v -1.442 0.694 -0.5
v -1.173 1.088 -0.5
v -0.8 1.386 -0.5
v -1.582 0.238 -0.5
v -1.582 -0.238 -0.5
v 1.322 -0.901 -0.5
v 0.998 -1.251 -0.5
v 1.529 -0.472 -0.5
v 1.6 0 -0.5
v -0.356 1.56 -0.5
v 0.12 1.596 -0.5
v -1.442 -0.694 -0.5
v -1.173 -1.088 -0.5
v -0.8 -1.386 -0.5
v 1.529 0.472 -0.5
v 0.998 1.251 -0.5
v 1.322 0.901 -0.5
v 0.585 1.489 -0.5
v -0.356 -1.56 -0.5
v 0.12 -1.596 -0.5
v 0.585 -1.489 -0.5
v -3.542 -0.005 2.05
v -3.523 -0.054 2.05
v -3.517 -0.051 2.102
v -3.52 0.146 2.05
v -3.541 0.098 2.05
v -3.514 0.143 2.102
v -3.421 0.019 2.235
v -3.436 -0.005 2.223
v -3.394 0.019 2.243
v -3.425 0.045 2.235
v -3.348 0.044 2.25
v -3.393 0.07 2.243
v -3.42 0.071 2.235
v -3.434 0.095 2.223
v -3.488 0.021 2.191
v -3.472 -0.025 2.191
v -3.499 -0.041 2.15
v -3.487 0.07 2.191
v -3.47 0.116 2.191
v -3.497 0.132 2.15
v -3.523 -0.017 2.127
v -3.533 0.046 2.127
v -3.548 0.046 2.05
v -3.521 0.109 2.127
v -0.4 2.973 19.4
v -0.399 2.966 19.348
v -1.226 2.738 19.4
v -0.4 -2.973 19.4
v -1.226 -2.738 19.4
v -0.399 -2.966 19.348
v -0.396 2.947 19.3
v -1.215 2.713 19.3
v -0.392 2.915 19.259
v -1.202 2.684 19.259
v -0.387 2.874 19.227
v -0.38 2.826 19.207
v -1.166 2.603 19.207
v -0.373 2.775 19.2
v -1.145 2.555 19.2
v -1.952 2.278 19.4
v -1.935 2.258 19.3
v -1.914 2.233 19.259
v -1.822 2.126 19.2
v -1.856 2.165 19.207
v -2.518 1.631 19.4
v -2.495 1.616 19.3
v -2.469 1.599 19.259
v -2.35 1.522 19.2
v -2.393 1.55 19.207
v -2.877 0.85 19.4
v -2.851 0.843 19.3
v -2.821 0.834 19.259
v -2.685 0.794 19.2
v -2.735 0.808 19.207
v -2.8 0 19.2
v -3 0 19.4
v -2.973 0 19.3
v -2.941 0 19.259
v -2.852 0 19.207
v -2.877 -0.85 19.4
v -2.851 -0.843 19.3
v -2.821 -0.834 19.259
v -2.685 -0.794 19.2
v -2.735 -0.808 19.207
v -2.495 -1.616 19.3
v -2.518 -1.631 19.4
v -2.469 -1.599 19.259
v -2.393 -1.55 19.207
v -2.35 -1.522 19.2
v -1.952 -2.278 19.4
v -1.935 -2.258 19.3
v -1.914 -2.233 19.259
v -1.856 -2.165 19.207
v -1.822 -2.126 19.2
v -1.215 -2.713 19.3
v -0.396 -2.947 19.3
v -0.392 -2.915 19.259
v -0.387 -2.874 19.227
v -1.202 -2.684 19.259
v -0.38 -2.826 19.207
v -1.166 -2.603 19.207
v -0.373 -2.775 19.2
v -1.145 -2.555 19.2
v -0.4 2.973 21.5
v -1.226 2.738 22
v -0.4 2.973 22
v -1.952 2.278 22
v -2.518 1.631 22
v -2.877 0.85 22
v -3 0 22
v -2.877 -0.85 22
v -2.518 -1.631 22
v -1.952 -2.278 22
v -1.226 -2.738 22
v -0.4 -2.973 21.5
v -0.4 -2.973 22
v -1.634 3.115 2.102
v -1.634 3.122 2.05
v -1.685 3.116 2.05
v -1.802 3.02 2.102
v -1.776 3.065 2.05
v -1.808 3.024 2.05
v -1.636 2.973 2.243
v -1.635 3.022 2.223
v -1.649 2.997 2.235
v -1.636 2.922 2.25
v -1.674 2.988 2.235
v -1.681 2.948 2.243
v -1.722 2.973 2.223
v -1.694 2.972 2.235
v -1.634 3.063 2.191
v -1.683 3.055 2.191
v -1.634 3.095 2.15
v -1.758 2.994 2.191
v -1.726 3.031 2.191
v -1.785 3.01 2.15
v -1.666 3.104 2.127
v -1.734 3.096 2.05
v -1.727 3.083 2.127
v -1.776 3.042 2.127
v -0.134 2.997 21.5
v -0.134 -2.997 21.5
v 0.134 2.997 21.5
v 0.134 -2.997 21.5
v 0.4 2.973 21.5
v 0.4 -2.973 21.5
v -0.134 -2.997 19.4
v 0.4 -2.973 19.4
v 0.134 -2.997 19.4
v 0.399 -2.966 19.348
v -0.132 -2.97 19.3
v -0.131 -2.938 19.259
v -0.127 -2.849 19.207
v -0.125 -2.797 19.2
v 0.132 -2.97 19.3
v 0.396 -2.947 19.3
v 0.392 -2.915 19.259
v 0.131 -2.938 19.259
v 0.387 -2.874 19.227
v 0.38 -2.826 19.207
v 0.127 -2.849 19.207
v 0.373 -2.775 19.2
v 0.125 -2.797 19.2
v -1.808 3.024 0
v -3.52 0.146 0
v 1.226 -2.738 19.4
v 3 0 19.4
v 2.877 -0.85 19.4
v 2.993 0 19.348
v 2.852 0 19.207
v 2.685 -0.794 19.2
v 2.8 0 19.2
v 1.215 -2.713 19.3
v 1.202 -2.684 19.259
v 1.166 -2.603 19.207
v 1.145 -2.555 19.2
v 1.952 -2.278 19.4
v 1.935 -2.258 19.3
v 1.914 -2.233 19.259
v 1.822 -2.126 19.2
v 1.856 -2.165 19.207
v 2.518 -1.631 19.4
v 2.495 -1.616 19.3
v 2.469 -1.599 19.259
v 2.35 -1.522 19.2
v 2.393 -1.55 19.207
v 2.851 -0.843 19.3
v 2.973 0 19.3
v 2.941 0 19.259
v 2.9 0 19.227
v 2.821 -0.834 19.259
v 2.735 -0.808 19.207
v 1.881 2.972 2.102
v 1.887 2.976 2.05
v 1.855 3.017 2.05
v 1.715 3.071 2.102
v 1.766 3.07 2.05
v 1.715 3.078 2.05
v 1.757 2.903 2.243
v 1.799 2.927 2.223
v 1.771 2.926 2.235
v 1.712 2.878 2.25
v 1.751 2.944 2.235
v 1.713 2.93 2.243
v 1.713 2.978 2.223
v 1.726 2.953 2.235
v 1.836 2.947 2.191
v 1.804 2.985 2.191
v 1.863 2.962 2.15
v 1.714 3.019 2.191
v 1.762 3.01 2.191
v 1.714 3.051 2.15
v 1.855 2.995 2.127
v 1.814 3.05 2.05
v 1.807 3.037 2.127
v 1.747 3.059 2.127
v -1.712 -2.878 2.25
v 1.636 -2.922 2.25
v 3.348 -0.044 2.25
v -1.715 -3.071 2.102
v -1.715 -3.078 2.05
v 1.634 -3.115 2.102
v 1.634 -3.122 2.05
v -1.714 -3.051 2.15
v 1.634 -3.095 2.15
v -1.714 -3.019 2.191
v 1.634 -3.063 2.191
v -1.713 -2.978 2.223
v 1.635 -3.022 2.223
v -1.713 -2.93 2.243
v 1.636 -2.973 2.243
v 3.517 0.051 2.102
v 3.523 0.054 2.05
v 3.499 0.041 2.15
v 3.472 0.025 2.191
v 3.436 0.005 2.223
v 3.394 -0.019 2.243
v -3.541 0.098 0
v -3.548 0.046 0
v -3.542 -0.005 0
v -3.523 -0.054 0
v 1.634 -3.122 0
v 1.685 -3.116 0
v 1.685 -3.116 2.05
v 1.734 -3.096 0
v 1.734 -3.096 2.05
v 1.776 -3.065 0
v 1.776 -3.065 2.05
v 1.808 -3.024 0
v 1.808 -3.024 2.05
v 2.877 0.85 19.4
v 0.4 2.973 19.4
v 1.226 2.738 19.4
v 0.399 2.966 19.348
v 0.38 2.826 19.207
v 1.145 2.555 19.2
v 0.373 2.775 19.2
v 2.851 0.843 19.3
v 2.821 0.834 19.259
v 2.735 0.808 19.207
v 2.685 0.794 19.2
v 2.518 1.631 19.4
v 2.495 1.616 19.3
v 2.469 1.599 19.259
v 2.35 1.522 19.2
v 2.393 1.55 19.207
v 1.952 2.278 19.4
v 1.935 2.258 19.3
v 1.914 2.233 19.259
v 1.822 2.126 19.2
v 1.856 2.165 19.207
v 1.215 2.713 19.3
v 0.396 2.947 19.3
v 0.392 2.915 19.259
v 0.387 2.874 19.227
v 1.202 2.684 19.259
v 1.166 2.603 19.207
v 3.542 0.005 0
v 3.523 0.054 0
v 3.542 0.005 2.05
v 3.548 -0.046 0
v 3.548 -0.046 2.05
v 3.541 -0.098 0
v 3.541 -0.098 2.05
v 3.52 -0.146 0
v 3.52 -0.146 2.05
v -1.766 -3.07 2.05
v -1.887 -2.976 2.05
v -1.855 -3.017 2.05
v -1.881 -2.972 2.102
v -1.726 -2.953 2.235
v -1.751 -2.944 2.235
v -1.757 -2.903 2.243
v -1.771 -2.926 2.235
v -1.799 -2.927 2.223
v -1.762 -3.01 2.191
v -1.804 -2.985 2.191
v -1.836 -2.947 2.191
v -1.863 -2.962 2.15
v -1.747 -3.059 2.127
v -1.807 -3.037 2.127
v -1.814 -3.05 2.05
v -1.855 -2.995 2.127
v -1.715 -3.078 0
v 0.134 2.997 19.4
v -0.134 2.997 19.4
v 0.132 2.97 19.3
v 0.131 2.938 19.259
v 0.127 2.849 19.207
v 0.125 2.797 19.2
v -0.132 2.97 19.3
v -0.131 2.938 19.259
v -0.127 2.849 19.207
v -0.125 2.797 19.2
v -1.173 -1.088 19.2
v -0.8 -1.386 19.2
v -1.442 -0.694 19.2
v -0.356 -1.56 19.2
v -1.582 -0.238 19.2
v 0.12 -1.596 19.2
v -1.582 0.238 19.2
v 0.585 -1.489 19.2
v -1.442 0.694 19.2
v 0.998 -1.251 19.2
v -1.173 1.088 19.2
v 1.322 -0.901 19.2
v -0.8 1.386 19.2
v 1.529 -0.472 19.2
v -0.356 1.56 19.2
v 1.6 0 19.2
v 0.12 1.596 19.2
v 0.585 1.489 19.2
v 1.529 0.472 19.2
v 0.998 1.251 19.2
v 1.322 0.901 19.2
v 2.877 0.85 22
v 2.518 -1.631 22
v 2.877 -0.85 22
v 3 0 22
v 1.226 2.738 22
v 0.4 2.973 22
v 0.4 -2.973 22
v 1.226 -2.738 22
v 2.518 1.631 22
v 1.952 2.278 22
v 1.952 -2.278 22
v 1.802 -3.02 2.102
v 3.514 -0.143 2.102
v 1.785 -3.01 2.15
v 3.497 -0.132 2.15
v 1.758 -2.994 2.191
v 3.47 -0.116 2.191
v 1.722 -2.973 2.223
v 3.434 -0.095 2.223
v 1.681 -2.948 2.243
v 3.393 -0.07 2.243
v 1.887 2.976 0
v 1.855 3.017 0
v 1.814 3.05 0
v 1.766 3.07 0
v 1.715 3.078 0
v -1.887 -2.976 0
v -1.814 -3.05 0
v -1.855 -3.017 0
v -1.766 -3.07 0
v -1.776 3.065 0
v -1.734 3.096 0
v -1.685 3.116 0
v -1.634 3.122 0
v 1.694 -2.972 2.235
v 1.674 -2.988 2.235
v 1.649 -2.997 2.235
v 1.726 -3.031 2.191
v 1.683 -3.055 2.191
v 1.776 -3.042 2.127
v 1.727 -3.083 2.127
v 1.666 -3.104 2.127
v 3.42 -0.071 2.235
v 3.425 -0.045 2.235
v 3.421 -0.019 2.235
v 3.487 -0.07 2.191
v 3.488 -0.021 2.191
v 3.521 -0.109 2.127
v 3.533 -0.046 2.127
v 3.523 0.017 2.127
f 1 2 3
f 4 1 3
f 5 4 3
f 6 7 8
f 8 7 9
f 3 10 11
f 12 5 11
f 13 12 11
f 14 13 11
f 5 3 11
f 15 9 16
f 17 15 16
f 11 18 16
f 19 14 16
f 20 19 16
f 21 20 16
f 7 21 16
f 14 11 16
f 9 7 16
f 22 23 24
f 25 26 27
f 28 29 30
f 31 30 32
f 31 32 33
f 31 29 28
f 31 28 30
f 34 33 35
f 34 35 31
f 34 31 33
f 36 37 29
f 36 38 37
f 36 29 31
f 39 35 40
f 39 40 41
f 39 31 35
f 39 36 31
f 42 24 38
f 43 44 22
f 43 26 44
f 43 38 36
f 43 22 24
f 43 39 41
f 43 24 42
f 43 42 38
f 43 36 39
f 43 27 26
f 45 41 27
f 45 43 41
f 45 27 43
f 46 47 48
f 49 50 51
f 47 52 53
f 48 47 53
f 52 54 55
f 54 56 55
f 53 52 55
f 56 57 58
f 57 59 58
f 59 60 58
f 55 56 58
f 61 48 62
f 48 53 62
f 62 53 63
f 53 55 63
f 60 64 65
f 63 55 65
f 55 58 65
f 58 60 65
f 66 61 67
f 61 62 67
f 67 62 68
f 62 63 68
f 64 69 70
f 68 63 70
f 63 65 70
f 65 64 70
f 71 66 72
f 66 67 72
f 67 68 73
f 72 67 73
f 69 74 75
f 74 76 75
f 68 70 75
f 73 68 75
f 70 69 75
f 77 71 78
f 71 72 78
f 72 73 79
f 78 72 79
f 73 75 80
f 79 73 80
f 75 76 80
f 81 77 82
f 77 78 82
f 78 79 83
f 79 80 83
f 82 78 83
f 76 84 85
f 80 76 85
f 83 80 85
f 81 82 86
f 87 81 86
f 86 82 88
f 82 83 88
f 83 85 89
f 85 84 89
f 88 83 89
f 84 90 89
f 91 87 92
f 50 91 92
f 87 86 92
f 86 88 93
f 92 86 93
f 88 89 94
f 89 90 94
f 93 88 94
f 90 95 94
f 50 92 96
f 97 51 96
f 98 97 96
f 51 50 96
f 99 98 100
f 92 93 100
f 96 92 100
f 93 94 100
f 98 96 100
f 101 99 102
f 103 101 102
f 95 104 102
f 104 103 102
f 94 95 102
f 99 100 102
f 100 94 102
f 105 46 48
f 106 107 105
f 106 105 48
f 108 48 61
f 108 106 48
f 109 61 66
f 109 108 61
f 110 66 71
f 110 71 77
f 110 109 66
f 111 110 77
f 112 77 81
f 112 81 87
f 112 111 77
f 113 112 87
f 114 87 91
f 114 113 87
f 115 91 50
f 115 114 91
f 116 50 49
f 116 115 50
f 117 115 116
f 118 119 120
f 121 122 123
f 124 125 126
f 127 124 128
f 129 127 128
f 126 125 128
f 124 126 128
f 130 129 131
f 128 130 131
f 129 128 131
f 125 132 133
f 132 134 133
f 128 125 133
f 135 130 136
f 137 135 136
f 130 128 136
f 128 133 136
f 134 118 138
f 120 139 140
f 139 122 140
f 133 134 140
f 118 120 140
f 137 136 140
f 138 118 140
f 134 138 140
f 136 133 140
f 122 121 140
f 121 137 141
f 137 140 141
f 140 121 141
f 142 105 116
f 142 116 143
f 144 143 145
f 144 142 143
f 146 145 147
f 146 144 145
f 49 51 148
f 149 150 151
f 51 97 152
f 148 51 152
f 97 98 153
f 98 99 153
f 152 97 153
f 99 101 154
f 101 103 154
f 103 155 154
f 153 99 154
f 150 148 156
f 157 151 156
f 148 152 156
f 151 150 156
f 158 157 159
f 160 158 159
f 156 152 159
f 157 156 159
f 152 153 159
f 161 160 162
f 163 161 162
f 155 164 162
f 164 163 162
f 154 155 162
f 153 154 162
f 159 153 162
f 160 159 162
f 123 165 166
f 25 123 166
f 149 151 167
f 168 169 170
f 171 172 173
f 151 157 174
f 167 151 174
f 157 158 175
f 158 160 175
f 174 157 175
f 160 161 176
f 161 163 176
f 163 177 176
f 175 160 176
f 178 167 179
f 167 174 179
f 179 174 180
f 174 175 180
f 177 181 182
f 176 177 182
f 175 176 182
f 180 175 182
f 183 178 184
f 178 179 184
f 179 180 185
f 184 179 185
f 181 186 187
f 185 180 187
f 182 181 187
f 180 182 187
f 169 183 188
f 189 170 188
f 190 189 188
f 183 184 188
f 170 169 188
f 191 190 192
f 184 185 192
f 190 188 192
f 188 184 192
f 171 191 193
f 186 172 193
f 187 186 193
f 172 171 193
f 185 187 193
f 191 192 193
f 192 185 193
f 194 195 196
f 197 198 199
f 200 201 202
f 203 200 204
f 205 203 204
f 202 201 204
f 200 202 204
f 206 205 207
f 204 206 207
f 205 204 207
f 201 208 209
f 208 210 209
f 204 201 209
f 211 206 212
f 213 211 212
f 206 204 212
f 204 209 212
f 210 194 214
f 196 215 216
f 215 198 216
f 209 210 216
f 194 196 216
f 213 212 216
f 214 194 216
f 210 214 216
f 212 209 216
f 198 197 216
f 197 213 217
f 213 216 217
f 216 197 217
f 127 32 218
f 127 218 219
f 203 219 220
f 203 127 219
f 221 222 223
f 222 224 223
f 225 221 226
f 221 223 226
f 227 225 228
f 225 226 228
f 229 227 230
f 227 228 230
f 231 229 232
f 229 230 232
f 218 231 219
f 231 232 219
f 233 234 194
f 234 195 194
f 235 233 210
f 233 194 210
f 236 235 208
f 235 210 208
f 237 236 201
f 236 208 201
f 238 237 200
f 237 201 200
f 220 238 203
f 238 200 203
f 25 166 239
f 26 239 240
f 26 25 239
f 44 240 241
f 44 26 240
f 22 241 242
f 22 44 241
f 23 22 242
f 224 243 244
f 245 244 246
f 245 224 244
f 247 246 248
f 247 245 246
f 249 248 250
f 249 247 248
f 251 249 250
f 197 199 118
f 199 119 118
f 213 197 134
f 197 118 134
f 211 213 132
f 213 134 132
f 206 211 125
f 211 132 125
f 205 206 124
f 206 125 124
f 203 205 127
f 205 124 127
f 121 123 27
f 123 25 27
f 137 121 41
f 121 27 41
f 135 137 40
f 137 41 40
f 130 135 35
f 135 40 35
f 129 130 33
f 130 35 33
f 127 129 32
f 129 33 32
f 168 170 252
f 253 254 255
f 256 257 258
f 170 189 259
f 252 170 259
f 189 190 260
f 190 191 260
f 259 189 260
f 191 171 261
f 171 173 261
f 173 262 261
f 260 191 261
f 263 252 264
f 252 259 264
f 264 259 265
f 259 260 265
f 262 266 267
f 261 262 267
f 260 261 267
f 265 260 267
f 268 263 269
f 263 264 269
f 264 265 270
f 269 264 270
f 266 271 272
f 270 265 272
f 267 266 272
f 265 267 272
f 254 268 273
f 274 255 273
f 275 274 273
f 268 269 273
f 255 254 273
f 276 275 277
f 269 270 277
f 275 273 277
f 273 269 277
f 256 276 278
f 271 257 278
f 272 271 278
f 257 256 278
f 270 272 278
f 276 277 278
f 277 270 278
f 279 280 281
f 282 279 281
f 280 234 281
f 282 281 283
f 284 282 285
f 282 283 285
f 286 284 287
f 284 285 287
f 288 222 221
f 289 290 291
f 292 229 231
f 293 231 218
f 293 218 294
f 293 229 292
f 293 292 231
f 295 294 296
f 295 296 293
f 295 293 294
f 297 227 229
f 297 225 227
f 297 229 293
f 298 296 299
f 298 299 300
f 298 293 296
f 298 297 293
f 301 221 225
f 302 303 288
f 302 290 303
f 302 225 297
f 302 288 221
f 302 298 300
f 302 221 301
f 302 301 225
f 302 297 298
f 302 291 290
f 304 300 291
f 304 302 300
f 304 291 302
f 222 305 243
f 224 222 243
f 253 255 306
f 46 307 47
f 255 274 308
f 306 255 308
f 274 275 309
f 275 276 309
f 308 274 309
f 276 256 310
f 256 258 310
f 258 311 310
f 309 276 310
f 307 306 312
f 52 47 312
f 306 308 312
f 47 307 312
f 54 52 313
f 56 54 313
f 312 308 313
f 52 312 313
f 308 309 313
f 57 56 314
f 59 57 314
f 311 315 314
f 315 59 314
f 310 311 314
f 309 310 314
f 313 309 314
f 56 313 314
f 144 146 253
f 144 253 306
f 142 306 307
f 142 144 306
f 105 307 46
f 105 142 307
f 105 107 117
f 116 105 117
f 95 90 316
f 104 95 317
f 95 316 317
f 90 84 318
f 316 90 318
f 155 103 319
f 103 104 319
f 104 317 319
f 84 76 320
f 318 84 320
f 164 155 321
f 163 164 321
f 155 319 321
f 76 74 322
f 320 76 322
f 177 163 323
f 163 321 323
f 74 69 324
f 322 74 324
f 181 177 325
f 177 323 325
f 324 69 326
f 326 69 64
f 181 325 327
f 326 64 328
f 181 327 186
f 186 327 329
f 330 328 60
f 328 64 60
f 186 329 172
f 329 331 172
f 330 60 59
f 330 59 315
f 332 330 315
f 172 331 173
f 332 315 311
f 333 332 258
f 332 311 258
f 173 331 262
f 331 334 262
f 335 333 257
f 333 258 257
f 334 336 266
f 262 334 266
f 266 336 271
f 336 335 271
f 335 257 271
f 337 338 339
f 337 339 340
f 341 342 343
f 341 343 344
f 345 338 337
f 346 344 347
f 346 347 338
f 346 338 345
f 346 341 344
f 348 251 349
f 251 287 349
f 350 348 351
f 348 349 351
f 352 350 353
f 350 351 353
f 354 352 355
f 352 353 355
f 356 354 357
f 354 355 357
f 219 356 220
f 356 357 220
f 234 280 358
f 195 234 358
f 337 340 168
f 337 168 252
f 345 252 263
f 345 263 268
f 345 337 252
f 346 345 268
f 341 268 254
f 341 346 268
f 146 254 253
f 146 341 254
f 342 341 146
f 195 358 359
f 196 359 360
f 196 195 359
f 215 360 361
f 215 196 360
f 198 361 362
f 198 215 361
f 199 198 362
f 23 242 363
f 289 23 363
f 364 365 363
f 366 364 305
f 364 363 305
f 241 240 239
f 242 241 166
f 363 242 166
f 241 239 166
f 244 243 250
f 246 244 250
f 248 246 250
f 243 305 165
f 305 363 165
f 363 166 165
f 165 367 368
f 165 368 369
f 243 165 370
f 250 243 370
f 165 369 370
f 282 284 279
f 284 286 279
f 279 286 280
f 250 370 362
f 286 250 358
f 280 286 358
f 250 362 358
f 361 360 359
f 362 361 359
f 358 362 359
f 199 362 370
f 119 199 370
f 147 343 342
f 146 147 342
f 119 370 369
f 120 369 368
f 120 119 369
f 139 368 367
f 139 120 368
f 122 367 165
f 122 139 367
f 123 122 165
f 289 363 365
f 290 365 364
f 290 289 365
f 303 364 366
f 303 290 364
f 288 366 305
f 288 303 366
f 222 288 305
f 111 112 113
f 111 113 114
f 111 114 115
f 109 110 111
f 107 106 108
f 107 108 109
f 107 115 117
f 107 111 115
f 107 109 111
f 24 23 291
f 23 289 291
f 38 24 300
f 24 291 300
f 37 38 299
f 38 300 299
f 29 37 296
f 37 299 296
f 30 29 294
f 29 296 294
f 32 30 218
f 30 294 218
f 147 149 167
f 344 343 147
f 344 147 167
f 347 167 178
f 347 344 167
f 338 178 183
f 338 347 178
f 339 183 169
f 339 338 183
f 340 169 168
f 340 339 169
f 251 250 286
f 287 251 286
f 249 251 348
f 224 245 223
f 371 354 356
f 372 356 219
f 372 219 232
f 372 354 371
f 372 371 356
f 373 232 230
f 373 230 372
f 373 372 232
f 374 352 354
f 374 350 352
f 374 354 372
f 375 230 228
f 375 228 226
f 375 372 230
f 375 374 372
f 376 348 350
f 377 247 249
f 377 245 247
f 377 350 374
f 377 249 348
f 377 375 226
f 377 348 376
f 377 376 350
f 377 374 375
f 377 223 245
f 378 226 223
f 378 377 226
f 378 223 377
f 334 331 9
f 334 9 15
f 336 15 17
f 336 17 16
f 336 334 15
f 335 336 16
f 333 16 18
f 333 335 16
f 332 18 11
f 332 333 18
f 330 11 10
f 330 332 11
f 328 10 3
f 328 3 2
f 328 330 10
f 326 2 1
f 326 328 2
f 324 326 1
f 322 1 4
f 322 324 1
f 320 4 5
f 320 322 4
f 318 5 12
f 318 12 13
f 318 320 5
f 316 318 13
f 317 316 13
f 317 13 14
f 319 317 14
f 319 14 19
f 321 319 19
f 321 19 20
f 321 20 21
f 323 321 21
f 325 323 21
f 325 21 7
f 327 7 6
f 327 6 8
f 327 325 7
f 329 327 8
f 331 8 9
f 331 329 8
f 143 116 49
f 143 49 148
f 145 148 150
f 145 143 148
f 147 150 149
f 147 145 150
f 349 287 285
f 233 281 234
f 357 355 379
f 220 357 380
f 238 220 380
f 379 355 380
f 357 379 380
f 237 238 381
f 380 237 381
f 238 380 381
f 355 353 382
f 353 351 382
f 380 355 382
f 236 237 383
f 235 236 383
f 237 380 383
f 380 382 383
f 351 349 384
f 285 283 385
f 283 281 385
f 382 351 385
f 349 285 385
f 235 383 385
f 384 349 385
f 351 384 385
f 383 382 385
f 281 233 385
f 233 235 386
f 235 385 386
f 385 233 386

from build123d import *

# Parameters (mm, degrees)
F1_DEPTH      = 2.25
F2_R          = 1.6
F3_DEPTH      = 22
F3_DEPTH_BACK = 0.5
F5_DEPTH      = 2.8
F6_R          = 0.2
F6_2_R        = 0.2
F7_DEPTH      = 0.5


# Not quite as in the source:
# - a feature names something its author has since deleted; it is built from what else it names


with BuildPart() as f1:
    # F0 (on Top) → F1 (new body)
    with BuildSketch(Plane.XY):
        Polygon((3.5792652324, -0.0468372692), (1.8301948812, 3.0763159835), (-1.7490703512, 3.1231532527), (-3.5792652324, 0.0468372692), (-1.8301948812, -3.0763159835), (1.7490703512, -3.1231532527), align=None)
    extrude(amount=F1_DEPTH)

    # F6#2
    f6_2_edges = [f1.edges().sort_by_distance(p)[0] for p in [
        (2.664168, -1.584995, 2.25),
        (2.70473, 1.514739, 2.25),
        (-0.040562, -3.099735, 2.25),
        (-2.70473, -1.514739, 2.25),
        (0.040562, 3.099735, 2.25),
        (-2.664168, 1.584995, 2.25),
        (-1.830195, -3.076316, 1.125),
        (1.74907, -3.123153, 1.125),
        (3.579265, -0.046837, 1.125),
        (-3.579265, 0.046837, 1.125),
        (1.830195, 3.076316, 1.125),
        (-1.74907, 3.123153, 1.125),
    ]]
    fillet(f6_2_edges, radius=F6_2_R)


with BuildPart() as f3:
    # F2 (on Top) → F3 (new body, two sides)
    with BuildSketch(Plane.XY) as f3_sk:
        Circle(F2_R)
    extrude(amount=F3_DEPTH)
    extrude(f3_sk.sketch, amount=-F3_DEPTH_BACK)

    # F4 (on face) → F5 (join)
    with BuildSketch(Plane.XY.offset(22)):
        with BuildLine():
            ThreePointArc((0.4, -2.9732137495), (2.2583179581, -1.9748417658), (3, 0))
            ThreePointArc((3, 0), (2.2583179581, 1.9748417658), (0.4, 2.9732137495))
            Line((0.4, 2.9732137495), (0.4, -2.9732137495))
        make_face()
        with BuildLine():
            Line((0.4, -2.9732137495), (0.4, 2.9732137495))
            ThreePointArc((0.4, 2.9732137495), (0, 3), (-0.4, 2.9732137495))
            Line((-0.4, 2.9732137495), (-0.4, -2.9732137495))
            ThreePointArc((-0.4, -2.9732137495), (0, -3), (0.4, -2.9732137495))
        make_face()
        with BuildLine():
            Line((-0.4, -2.9732137495), (-0.4, 2.9732137495))
            ThreePointArc((-0.4, 2.9732137495), (-3, 0), (-0.4, -2.9732137495))
        make_face()
    extrude(amount=-F5_DEPTH)

    # F6
    f6_edges = [f3.edges().sort_by_distance(p)[0] for p in [
        (0.4, -2.973214, 19.2),
    ]]
    fillet(f6_edges, radius=F6_R)

    # F4 (on face) → F7 (cut)
    with BuildSketch(Plane.XY.offset(22)):
        with BuildLine():
            Line((0.4, 1.5491933385), (0.4, 2.9732137495))
            ThreePointArc((0.4, 2.9732137495), (0, 3), (-0.4, 2.9732137495))
            Line((-0.4, 2.9732137495), (-0.4, 1.5491933385))
            ThreePointArc((-0.4, 1.5491933385), (0, 1.6), (0.4, 1.5491933385))
        make_face()
        with BuildLine():
            Line((0.4, -1.5491933385), (0.4, 1.5491933385))
            ThreePointArc((0.4, 1.5491933385), (0, 1.6), (-0.4, 1.5491933385))
            Line((-0.4, 1.5491933385), (-0.4, -1.5491933385))
            ThreePointArc((-0.4, -1.5491933385), (0, -1.6), (0.4, -1.5491933385))
        make_face()
        with BuildLine():
            ThreePointArc((-0.4, -2.9732137495), (0, -3), (0.4, -2.9732137495))
            Line((0.4, -2.9732137495), (0.4, -1.5491933385))
            ThreePointArc((0.4, -1.5491933385), (0, -1.6), (-0.4, -1.5491933385))
            Line((-0.4, -1.5491933385), (-0.4, -2.9732137495))
        make_face()
    extrude(amount=-F7_DEPTH, mode=Mode.SUBTRACT)


solid = Compound([f1.part, f3.part])
